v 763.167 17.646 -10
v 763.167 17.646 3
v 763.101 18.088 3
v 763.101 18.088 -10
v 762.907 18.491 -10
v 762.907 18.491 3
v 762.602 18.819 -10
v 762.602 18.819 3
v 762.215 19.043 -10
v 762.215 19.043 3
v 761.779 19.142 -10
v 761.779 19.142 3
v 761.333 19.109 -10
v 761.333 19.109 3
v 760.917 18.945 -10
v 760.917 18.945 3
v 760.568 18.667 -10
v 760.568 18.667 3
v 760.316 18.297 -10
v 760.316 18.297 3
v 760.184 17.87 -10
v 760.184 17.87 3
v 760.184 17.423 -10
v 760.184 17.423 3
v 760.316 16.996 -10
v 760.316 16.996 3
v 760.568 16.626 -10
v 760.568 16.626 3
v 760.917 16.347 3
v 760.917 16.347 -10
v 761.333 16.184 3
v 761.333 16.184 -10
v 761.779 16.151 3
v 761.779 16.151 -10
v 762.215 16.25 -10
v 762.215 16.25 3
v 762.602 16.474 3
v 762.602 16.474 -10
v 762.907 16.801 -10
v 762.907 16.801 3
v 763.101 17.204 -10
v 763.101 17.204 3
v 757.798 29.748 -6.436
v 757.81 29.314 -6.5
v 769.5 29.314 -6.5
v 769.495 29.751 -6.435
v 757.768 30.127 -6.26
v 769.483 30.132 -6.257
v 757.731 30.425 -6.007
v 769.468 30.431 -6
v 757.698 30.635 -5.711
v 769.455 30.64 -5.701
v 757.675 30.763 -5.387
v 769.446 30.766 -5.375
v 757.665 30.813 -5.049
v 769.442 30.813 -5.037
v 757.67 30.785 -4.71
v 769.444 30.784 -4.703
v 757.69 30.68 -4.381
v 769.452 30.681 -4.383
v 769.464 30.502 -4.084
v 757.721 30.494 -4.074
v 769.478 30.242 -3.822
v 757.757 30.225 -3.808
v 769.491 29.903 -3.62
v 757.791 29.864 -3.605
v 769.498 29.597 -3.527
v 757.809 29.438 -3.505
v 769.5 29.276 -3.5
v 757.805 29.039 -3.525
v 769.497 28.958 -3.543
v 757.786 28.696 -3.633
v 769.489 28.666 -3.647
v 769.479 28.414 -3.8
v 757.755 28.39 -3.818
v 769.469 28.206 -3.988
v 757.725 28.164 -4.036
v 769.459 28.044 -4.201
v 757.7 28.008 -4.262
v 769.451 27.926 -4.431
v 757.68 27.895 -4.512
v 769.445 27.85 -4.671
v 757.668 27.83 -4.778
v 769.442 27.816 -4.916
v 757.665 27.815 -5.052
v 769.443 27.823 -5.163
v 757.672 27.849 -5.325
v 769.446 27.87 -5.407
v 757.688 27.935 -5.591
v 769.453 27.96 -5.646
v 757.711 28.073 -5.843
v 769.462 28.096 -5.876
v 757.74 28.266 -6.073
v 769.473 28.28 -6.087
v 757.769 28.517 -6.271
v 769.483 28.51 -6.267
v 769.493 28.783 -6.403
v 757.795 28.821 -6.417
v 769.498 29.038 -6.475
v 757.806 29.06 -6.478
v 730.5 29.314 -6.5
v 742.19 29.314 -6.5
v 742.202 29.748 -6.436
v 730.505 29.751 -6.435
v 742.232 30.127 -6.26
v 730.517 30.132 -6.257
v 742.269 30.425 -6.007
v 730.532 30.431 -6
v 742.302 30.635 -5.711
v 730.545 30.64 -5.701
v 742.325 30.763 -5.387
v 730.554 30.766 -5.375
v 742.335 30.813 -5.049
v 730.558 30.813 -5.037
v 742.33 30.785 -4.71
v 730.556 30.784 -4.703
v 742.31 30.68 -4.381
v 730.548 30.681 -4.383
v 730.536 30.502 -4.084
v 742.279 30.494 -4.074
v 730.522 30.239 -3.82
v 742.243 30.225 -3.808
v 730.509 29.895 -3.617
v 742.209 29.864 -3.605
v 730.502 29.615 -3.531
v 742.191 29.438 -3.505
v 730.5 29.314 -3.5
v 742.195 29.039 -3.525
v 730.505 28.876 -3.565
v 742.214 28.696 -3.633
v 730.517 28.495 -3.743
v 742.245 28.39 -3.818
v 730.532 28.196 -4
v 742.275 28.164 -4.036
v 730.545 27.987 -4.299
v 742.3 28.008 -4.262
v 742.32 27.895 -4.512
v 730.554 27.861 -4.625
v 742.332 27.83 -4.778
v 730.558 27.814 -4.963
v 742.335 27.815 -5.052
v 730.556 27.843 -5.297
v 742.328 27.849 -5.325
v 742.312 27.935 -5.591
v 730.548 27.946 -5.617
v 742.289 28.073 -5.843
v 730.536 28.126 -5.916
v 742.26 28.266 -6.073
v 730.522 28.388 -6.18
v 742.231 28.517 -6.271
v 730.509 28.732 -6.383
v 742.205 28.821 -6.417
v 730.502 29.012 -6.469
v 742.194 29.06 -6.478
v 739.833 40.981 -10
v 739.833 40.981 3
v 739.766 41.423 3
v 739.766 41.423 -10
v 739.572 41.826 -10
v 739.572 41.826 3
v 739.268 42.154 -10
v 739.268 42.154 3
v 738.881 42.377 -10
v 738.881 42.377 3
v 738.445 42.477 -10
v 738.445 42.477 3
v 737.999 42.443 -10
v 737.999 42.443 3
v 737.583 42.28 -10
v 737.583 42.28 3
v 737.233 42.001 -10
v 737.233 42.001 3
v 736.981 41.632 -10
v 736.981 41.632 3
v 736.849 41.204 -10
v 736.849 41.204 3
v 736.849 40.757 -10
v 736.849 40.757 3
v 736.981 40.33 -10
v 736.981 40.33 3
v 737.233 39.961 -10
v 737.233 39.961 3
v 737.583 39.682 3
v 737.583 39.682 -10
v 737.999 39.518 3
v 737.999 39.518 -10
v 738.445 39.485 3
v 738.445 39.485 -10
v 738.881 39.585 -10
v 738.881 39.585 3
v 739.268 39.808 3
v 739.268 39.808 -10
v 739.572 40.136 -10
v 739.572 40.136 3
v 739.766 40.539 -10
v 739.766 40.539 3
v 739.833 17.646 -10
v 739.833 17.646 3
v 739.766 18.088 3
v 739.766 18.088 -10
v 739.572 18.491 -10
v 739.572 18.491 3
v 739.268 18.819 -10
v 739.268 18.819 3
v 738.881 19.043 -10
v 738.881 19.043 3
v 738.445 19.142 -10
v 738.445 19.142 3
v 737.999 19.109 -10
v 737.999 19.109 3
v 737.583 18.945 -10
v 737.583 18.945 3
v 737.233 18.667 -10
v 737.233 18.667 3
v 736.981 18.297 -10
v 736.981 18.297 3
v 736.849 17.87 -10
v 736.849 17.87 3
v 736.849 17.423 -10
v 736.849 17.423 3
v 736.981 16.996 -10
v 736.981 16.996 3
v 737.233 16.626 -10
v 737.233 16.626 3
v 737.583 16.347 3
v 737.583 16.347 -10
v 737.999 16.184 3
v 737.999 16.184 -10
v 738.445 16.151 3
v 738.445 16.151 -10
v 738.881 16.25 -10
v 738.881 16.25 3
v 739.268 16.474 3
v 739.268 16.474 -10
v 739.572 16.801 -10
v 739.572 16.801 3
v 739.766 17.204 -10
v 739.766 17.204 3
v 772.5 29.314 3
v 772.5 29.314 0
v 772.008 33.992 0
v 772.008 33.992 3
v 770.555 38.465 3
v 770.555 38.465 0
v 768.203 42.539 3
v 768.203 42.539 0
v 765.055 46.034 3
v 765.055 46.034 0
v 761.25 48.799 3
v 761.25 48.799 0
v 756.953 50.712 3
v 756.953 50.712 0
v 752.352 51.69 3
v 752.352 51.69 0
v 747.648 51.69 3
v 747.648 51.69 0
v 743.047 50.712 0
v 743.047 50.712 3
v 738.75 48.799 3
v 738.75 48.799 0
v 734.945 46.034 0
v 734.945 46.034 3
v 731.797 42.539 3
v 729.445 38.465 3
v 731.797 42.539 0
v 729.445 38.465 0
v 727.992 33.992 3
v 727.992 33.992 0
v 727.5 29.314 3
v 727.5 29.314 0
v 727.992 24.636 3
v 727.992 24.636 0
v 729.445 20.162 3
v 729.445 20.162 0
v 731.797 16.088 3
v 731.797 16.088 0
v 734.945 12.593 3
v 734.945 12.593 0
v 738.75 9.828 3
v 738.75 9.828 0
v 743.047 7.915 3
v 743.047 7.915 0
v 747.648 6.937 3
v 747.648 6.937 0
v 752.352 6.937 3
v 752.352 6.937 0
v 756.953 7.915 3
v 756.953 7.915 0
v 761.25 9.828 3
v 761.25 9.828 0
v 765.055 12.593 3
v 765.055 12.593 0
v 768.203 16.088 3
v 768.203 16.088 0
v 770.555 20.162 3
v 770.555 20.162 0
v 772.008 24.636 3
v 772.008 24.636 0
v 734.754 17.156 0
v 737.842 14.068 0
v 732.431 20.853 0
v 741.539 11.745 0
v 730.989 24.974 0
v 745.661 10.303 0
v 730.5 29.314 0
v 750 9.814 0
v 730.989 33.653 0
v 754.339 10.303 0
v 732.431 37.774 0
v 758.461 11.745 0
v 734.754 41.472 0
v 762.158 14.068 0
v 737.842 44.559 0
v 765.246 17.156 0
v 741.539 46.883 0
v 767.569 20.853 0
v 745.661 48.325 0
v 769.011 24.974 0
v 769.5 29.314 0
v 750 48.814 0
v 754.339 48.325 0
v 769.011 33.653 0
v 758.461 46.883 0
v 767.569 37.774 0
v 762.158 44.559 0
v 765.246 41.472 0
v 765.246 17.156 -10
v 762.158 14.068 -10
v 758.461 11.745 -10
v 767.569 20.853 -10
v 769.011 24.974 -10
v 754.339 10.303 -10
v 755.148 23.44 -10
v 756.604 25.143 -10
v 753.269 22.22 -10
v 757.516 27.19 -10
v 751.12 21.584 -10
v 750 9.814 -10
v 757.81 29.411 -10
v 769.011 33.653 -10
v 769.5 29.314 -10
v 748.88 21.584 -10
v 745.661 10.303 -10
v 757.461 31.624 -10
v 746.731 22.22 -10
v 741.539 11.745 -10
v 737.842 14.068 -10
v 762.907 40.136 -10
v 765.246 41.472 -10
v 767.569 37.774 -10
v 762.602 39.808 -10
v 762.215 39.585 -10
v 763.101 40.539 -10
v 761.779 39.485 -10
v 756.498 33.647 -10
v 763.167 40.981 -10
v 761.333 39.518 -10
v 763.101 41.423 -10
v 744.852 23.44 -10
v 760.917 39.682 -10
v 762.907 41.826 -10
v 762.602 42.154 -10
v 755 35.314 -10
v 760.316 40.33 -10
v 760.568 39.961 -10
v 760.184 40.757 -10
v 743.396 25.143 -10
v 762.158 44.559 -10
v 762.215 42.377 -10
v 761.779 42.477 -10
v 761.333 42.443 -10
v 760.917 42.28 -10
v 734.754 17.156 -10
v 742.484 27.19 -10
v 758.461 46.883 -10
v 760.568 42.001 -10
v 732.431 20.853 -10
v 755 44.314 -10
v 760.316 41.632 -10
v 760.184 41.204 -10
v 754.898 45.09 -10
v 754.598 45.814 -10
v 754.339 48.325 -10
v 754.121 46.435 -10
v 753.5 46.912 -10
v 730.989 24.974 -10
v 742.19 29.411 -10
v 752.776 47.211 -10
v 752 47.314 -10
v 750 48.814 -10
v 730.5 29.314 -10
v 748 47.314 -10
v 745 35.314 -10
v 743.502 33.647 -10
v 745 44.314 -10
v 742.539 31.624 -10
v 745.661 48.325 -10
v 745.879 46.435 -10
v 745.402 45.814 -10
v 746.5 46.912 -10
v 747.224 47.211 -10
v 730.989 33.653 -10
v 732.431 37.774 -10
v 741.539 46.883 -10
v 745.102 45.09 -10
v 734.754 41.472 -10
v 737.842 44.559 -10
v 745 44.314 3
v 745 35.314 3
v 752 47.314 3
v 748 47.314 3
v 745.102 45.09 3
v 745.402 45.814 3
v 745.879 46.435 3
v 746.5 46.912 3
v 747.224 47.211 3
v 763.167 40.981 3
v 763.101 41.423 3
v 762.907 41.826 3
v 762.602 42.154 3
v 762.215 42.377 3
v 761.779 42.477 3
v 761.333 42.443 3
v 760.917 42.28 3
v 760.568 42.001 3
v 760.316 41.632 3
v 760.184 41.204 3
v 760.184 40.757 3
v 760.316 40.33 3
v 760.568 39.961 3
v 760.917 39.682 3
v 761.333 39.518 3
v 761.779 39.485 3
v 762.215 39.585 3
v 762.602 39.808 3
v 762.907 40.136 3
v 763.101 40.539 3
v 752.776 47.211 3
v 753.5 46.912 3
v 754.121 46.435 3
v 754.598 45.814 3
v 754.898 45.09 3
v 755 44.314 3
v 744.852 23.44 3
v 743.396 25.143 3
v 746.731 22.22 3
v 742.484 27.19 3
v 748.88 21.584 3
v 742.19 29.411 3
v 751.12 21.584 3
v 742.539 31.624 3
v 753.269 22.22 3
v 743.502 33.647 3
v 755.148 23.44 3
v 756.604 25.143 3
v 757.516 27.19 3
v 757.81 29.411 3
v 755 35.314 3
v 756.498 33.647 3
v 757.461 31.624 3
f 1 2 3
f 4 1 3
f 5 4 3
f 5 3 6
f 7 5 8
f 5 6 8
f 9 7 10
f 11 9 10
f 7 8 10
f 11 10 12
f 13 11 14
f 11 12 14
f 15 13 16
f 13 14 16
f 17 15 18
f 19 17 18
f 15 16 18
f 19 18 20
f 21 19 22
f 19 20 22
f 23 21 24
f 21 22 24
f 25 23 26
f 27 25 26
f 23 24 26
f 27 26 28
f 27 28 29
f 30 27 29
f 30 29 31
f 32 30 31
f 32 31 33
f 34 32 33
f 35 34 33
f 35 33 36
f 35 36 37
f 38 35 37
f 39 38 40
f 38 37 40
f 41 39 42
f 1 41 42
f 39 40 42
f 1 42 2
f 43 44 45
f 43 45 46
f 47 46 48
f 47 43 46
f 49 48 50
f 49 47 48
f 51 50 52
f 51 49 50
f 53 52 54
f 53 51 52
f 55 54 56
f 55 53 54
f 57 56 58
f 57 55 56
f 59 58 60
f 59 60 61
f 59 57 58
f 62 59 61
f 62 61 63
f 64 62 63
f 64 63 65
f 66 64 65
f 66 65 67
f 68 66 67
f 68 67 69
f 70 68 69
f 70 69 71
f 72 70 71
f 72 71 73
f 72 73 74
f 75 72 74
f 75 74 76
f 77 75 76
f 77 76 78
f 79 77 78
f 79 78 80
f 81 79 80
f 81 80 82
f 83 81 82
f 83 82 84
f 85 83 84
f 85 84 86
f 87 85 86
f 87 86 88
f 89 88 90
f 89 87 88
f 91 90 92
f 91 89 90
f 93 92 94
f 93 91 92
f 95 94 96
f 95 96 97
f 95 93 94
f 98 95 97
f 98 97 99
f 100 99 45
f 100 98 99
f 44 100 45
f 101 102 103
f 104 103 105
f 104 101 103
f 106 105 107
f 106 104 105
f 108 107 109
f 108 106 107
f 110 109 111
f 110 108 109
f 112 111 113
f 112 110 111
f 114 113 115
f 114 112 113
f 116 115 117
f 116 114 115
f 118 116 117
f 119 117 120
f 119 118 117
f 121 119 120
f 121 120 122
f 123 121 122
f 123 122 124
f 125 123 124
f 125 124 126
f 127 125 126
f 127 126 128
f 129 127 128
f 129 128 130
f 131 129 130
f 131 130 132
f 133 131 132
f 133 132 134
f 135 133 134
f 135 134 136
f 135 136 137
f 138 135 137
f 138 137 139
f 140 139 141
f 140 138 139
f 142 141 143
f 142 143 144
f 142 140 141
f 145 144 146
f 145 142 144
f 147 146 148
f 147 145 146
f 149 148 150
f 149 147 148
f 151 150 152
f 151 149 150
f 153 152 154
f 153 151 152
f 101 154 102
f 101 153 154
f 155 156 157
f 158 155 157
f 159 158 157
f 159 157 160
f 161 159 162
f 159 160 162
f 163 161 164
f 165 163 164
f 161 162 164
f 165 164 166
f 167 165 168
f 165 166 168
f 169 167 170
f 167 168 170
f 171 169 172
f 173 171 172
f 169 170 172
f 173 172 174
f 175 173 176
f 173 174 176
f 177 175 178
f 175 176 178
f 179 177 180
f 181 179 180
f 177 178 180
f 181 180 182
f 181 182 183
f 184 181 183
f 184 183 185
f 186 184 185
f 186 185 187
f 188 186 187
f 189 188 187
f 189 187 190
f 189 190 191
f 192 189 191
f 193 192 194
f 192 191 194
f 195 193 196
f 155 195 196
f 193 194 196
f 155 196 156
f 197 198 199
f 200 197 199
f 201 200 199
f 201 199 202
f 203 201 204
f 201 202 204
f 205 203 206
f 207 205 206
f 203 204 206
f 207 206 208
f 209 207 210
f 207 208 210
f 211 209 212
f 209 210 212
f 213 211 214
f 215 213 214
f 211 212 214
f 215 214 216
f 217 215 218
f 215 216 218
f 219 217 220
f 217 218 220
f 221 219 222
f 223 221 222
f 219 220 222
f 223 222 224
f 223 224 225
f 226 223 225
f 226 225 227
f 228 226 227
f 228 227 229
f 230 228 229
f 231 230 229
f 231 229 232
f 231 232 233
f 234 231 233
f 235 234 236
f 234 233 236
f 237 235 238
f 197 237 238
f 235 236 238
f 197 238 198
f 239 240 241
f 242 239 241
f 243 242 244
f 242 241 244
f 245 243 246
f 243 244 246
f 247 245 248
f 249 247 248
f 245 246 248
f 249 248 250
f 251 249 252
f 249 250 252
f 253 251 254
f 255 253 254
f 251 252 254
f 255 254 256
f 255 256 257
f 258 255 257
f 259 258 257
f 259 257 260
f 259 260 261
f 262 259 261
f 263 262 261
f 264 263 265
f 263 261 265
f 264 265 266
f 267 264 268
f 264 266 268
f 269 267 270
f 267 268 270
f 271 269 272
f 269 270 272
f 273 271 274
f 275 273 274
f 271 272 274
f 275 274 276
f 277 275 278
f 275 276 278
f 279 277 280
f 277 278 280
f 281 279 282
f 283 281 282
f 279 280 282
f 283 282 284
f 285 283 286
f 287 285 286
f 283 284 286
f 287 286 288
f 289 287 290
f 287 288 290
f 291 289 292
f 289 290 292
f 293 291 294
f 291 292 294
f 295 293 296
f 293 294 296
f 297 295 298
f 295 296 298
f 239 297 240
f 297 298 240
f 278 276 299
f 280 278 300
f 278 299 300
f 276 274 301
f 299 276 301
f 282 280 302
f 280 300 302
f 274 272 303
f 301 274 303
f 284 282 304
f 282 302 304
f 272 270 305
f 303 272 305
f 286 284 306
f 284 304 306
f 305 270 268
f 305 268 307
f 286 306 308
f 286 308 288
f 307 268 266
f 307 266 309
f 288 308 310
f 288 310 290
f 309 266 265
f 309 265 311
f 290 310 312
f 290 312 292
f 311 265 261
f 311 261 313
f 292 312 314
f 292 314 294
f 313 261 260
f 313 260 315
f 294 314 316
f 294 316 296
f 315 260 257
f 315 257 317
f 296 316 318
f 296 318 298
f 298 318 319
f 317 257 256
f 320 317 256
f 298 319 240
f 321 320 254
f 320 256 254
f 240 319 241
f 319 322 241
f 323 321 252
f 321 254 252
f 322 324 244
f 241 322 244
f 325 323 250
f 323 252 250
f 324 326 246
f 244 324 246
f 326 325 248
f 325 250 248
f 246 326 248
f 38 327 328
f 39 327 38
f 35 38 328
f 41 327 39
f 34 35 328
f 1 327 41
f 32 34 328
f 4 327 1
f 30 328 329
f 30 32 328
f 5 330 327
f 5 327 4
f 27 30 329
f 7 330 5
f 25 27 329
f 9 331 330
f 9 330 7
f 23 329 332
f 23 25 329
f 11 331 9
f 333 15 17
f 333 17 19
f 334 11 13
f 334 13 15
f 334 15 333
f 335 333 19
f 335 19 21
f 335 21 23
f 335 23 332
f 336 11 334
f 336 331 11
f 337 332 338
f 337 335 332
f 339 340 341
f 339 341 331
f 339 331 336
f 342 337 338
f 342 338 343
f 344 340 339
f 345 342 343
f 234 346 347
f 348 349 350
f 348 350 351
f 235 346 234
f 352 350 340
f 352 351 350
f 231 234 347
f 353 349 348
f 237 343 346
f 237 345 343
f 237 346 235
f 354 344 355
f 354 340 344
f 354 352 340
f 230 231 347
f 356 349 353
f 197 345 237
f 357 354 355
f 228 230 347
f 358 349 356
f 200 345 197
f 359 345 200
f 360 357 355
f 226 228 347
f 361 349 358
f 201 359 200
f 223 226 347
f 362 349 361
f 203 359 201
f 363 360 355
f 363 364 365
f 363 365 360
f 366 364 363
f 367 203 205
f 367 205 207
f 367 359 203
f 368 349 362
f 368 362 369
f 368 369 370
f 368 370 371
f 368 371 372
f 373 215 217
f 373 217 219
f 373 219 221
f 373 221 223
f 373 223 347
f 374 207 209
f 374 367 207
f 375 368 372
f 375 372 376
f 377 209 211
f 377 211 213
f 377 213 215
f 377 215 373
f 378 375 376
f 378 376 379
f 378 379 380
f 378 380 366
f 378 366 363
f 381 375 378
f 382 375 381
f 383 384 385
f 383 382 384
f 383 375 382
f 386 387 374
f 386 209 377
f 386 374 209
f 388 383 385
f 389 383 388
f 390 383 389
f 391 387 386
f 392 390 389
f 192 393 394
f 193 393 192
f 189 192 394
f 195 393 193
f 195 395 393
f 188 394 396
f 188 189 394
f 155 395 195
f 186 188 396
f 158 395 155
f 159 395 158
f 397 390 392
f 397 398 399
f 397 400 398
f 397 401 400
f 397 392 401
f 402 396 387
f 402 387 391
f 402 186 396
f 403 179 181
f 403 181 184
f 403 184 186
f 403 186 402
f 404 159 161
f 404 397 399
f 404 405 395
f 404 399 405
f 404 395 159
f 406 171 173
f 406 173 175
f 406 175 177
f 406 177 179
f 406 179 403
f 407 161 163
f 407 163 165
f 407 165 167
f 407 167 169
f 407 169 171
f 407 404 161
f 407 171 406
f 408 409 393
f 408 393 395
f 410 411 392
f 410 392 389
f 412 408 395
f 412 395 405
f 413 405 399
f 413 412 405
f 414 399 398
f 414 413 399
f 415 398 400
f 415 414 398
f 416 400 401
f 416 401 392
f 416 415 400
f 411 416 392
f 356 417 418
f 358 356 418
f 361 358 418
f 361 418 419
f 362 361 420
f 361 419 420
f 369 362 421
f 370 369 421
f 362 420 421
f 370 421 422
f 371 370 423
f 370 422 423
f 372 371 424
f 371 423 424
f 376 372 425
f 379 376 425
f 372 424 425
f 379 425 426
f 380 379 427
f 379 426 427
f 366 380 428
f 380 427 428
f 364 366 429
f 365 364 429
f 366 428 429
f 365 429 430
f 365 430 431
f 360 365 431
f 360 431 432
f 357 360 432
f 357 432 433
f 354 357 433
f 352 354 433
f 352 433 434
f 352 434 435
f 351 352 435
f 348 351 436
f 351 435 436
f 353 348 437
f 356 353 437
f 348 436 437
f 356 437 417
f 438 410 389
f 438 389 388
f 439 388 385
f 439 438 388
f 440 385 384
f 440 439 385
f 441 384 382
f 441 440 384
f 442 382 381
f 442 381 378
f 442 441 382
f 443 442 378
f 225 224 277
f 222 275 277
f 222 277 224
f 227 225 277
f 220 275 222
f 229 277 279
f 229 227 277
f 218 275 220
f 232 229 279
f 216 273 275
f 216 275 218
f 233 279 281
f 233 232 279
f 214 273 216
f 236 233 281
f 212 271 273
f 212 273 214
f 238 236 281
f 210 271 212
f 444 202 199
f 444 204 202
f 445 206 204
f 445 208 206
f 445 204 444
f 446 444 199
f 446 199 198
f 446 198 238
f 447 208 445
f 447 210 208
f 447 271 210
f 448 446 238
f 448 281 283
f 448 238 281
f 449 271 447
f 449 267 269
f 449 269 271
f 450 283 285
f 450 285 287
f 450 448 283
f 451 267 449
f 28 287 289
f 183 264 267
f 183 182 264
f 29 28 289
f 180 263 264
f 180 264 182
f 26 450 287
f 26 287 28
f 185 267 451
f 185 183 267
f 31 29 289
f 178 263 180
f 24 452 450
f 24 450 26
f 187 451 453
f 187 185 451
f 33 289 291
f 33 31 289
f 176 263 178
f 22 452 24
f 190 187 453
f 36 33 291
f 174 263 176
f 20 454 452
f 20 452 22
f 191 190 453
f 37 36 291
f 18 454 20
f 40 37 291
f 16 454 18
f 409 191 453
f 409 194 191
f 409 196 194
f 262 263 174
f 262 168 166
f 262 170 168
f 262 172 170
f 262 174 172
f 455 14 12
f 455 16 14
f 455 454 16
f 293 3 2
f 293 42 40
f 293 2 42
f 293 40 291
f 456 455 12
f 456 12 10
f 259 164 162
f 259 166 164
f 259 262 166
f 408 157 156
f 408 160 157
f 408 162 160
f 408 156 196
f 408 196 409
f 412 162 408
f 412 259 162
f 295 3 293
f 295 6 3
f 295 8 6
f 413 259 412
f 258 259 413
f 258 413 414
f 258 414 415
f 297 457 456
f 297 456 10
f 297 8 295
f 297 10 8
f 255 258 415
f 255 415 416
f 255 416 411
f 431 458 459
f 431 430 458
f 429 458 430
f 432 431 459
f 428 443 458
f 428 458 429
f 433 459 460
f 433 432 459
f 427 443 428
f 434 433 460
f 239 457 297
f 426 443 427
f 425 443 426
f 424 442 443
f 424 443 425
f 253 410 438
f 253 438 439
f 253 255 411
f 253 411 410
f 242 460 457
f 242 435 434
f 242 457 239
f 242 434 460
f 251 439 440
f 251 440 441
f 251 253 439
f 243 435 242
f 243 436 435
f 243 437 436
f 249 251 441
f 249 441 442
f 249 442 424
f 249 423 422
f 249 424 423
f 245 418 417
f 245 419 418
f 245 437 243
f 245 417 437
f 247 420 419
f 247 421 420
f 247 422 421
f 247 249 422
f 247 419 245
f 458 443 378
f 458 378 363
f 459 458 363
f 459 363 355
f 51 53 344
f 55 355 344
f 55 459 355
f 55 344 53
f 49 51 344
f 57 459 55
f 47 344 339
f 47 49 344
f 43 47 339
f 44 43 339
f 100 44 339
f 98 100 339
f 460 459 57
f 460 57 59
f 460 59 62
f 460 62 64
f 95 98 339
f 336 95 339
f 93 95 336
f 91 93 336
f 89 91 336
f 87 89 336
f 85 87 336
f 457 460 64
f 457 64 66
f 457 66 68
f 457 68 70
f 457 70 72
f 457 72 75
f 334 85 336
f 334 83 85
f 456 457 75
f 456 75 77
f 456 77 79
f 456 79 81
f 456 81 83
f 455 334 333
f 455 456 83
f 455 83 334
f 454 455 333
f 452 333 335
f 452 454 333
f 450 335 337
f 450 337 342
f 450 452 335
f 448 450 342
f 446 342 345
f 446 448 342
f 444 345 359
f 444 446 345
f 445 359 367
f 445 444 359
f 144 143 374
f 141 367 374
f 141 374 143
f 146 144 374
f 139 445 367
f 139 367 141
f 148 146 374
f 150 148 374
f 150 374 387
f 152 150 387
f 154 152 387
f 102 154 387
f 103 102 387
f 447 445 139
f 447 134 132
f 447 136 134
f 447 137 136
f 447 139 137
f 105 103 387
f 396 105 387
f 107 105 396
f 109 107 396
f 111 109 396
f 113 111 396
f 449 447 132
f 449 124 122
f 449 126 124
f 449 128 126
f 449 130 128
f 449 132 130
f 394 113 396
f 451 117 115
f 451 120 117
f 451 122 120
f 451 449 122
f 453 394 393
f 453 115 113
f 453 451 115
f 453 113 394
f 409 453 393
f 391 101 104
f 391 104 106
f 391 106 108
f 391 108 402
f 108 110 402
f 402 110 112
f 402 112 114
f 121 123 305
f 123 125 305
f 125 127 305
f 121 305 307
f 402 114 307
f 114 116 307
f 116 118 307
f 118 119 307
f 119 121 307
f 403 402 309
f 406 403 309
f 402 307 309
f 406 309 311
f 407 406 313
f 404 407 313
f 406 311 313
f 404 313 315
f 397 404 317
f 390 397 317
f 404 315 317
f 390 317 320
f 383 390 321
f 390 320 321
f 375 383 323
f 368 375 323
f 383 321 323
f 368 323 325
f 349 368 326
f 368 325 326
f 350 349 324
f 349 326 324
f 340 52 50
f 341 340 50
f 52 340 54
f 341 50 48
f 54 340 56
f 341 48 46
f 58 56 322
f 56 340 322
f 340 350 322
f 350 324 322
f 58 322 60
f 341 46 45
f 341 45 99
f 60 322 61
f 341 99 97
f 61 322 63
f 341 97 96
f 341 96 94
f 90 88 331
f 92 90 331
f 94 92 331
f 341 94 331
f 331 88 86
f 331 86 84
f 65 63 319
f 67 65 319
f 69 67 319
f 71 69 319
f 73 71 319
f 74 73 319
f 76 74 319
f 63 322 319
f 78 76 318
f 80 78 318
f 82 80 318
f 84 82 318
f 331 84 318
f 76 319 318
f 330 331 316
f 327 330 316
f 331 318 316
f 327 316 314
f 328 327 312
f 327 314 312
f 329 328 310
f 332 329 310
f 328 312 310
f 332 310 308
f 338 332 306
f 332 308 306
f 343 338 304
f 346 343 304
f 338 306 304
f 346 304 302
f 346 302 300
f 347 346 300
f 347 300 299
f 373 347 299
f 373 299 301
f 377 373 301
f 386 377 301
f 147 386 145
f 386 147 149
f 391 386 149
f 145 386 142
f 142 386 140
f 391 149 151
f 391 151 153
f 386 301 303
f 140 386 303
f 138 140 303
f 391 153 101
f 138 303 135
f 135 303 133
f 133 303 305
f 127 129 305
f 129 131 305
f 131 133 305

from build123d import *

# Parameters (mm, degrees)
SKETCH1_R               = 22.5
BOSS_EXTRUDE1_DEPTH     = 3
SKETCH2_R               = 19.5
BOSS_EXTRUDE2_DEPTH     = 10
SKETCH3_R               = 1.5
CUT_EXTRUDE1_DEPTH      = 13
CUT_EXTRUDE2_DEPTH      = 60.505474974
CUT_EXTRUDE2_DEPTH_BACK = 60.505474974
SKETCH4_R               = 1.5


with BuildPart() as part:
    # Sketch1 → Boss-Extrude1 (new body)
    with BuildSketch(Plane.XY):
        with Locations((750, 29.313623227)):
            Circle(SKETCH1_R)
    extrude(amount=BOSS_EXTRUDE1_DEPTH)

    # Sketch2 → Boss-Extrude2 (add)
    with BuildSketch(Plane(origin=(0, 0, 0), x_dir=(-1, 0, 0), z_dir=(0, 0, -1))):
        with Locations((-750, 29.313623227)):
            Circle(SKETCH2_R)
    extrude(amount=BOSS_EXTRUDE2_DEPTH)

    # Sketch3 → Cut-Extrude1 (cut)
    with BuildSketch(Plane.XY.offset(3)):
        with Locations((761.66726189, 17.646361337)):
            Circle(SKETCH3_R)
        with Locations((738.33273811, 17.646361337)):
            Circle(SKETCH3_R)
        with Locations((738.33273811, 40.980885116)):
            Circle(SKETCH3_R)
        with Locations((761.66726189, 40.980885116)):
            Circle(SKETCH3_R)
        with BuildLine():
            Line((748, 47.313623227), (752, 47.313623227))
            ThreePointArc((752, 47.313623227), (754.121320344, 46.43494357), (755, 44.313623227))
            Line((755, 44.313623227), (755, 35.313623227))
            ThreePointArc((755, 35.313623227), (750, 21.503373551), (745, 35.313623227))
            Line((745, 35.313623227), (745, 44.313623227))
            ThreePointArc((745, 44.313623227), (745.878679656, 46.43494357), (748, 47.313623227))
        make_face()
    extrude(amount=-CUT_EXTRUDE1_DEPTH, mode=Mode.SUBTRACT)

    # Sketch4 → Cut-Extrude2 (cut, two sides: drawn at the far end of the back side and taken through both)
    with BuildSketch(Plane(origin=(745, 0, 0), x_dir=(0, 0, -1), z_dir=(1, 0, 0)).offset(-CUT_EXTRUDE2_DEPTH_BACK)):
        with Locations((5, 29.313623227)):
            Circle(SKETCH4_R)
    extrude(amount=CUT_EXTRUDE2_DEPTH + CUT_EXTRUDE2_DEPTH_BACK, mode=Mode.SUBTRACT)


solid = part.part
